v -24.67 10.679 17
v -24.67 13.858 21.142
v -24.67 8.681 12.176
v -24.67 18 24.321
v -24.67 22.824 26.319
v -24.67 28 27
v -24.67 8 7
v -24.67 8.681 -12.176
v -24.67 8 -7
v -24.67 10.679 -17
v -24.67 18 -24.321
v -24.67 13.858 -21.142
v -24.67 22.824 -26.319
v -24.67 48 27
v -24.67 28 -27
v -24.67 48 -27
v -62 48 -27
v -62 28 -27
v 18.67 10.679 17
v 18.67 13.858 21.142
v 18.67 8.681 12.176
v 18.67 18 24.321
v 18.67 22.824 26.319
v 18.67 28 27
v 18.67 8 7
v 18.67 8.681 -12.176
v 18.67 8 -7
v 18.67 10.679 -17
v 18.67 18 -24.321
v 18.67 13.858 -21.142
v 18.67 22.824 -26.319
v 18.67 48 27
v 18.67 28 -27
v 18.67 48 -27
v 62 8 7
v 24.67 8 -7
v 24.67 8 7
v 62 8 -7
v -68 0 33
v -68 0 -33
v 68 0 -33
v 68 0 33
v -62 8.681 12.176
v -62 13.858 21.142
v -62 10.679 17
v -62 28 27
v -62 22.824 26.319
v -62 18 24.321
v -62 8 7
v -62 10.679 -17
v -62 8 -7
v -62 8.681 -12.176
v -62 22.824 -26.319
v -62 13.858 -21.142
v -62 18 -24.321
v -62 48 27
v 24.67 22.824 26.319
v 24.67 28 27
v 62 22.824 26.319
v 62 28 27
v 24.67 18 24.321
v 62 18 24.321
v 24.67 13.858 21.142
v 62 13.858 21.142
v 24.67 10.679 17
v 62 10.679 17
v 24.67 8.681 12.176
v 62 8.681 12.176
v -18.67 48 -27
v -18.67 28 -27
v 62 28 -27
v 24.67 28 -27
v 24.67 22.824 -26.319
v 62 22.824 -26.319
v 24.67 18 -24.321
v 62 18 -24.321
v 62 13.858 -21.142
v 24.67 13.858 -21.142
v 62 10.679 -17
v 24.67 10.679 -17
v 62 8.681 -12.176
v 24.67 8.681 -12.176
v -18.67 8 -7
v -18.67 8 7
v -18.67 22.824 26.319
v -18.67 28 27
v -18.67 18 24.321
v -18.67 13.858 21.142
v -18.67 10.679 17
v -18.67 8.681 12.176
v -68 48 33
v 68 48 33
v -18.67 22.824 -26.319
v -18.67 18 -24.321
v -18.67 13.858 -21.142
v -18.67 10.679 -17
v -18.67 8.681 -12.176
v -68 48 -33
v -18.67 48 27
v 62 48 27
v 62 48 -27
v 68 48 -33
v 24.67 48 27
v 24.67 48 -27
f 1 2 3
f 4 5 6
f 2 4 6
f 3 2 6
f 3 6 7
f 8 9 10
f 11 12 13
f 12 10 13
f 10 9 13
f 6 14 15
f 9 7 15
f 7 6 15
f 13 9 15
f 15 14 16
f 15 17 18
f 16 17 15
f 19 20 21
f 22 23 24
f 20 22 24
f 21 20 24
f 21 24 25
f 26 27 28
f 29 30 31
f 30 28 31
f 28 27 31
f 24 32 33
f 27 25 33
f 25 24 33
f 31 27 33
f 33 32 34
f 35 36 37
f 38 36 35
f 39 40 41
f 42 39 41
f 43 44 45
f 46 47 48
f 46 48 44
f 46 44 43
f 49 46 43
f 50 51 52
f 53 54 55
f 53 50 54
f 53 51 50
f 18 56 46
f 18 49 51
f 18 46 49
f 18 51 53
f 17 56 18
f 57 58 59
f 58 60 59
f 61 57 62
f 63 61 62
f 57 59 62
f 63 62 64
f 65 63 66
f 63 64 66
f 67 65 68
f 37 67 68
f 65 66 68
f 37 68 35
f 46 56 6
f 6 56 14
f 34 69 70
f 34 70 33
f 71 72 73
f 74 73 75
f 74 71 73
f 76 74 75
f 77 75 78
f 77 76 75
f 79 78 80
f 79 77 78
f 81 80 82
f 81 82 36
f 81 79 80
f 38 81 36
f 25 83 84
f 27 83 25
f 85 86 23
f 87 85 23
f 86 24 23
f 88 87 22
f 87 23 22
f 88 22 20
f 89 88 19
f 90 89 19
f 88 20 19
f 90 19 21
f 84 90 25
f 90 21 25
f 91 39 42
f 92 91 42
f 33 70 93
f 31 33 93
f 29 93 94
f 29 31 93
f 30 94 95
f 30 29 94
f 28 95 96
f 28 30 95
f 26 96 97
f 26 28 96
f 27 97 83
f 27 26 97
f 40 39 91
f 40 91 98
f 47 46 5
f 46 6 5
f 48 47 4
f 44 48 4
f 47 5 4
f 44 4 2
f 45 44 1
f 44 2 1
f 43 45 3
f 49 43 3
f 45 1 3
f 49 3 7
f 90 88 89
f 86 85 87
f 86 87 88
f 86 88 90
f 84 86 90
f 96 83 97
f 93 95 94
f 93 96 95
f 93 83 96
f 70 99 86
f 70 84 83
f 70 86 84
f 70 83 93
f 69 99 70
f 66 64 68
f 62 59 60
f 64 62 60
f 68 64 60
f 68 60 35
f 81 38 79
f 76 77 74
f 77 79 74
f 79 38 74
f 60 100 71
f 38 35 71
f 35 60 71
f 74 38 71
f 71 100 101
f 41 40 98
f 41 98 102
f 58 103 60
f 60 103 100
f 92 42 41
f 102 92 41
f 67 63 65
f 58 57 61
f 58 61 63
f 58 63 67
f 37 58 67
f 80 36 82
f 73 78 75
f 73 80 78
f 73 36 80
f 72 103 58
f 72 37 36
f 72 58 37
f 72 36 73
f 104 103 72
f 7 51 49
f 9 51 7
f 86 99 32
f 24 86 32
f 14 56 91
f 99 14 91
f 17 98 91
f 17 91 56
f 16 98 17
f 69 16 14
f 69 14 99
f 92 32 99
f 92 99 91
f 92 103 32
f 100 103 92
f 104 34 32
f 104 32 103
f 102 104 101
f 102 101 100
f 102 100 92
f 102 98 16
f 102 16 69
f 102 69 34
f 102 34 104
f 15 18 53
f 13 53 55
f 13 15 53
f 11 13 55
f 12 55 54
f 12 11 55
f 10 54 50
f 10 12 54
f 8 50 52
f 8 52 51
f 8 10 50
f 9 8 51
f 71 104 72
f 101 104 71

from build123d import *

# Parameters (mm, degrees)
SKETCH1_W           = 136
SKETCH1_H           = 66
BOSS_EXTRUDE1_DEPTH = 48
CUT_EXTRUDE1_START  = 8
SKETCH2_W           = 37.33
SKETCH2_H           = 54
SKETCH2_W_2         = 37.34
CUT_EXTRUDE1_DEPTH  = 48
FILLET1_R           = 20


with BuildPart() as part:
    # Sketch1 → Boss-Extrude1 (new body)
    with BuildSketch(Plane(origin=(0, 0, 0), x_dir=(1, 0, 0), z_dir=(0, 1, 0))):
        Rectangle(SKETCH1_W, SKETCH1_H)
    extrude(amount=BOSS_EXTRUDE1_DEPTH)

    # Sketch2 → Cut-Extrude1 (cut)
    with BuildSketch(Plane(origin=(0, 48, 0), x_dir=(1, 0, 0), z_dir=(0, 1, 0)).offset(CUT_EXTRUDE1_START)):
        with Locations((-43.335, 0)):
            Rectangle(SKETCH2_W, SKETCH2_H)
        Rectangle(SKETCH2_W_2, SKETCH2_H)
        with Locations((43.335, 0)):
            Rectangle(SKETCH2_W, SKETCH2_H)
    extrude(amount=-CUT_EXTRUDE1_DEPTH, mode=Mode.SUBTRACT)

    # Fillet1
    fillet1_edges = [part.edges().sort_by_distance(p)[0] for p in [
        (-43.335, 8, -27),
        (-43.335, 8, 27),
        (0, 8, -27),
        (0, 8, 27),
        (43.335, 8, -27),
        (43.335, 8, 27),
    ]]
    fillet(fillet1_edges, radius=FILLET1_R)


solid = part.part
